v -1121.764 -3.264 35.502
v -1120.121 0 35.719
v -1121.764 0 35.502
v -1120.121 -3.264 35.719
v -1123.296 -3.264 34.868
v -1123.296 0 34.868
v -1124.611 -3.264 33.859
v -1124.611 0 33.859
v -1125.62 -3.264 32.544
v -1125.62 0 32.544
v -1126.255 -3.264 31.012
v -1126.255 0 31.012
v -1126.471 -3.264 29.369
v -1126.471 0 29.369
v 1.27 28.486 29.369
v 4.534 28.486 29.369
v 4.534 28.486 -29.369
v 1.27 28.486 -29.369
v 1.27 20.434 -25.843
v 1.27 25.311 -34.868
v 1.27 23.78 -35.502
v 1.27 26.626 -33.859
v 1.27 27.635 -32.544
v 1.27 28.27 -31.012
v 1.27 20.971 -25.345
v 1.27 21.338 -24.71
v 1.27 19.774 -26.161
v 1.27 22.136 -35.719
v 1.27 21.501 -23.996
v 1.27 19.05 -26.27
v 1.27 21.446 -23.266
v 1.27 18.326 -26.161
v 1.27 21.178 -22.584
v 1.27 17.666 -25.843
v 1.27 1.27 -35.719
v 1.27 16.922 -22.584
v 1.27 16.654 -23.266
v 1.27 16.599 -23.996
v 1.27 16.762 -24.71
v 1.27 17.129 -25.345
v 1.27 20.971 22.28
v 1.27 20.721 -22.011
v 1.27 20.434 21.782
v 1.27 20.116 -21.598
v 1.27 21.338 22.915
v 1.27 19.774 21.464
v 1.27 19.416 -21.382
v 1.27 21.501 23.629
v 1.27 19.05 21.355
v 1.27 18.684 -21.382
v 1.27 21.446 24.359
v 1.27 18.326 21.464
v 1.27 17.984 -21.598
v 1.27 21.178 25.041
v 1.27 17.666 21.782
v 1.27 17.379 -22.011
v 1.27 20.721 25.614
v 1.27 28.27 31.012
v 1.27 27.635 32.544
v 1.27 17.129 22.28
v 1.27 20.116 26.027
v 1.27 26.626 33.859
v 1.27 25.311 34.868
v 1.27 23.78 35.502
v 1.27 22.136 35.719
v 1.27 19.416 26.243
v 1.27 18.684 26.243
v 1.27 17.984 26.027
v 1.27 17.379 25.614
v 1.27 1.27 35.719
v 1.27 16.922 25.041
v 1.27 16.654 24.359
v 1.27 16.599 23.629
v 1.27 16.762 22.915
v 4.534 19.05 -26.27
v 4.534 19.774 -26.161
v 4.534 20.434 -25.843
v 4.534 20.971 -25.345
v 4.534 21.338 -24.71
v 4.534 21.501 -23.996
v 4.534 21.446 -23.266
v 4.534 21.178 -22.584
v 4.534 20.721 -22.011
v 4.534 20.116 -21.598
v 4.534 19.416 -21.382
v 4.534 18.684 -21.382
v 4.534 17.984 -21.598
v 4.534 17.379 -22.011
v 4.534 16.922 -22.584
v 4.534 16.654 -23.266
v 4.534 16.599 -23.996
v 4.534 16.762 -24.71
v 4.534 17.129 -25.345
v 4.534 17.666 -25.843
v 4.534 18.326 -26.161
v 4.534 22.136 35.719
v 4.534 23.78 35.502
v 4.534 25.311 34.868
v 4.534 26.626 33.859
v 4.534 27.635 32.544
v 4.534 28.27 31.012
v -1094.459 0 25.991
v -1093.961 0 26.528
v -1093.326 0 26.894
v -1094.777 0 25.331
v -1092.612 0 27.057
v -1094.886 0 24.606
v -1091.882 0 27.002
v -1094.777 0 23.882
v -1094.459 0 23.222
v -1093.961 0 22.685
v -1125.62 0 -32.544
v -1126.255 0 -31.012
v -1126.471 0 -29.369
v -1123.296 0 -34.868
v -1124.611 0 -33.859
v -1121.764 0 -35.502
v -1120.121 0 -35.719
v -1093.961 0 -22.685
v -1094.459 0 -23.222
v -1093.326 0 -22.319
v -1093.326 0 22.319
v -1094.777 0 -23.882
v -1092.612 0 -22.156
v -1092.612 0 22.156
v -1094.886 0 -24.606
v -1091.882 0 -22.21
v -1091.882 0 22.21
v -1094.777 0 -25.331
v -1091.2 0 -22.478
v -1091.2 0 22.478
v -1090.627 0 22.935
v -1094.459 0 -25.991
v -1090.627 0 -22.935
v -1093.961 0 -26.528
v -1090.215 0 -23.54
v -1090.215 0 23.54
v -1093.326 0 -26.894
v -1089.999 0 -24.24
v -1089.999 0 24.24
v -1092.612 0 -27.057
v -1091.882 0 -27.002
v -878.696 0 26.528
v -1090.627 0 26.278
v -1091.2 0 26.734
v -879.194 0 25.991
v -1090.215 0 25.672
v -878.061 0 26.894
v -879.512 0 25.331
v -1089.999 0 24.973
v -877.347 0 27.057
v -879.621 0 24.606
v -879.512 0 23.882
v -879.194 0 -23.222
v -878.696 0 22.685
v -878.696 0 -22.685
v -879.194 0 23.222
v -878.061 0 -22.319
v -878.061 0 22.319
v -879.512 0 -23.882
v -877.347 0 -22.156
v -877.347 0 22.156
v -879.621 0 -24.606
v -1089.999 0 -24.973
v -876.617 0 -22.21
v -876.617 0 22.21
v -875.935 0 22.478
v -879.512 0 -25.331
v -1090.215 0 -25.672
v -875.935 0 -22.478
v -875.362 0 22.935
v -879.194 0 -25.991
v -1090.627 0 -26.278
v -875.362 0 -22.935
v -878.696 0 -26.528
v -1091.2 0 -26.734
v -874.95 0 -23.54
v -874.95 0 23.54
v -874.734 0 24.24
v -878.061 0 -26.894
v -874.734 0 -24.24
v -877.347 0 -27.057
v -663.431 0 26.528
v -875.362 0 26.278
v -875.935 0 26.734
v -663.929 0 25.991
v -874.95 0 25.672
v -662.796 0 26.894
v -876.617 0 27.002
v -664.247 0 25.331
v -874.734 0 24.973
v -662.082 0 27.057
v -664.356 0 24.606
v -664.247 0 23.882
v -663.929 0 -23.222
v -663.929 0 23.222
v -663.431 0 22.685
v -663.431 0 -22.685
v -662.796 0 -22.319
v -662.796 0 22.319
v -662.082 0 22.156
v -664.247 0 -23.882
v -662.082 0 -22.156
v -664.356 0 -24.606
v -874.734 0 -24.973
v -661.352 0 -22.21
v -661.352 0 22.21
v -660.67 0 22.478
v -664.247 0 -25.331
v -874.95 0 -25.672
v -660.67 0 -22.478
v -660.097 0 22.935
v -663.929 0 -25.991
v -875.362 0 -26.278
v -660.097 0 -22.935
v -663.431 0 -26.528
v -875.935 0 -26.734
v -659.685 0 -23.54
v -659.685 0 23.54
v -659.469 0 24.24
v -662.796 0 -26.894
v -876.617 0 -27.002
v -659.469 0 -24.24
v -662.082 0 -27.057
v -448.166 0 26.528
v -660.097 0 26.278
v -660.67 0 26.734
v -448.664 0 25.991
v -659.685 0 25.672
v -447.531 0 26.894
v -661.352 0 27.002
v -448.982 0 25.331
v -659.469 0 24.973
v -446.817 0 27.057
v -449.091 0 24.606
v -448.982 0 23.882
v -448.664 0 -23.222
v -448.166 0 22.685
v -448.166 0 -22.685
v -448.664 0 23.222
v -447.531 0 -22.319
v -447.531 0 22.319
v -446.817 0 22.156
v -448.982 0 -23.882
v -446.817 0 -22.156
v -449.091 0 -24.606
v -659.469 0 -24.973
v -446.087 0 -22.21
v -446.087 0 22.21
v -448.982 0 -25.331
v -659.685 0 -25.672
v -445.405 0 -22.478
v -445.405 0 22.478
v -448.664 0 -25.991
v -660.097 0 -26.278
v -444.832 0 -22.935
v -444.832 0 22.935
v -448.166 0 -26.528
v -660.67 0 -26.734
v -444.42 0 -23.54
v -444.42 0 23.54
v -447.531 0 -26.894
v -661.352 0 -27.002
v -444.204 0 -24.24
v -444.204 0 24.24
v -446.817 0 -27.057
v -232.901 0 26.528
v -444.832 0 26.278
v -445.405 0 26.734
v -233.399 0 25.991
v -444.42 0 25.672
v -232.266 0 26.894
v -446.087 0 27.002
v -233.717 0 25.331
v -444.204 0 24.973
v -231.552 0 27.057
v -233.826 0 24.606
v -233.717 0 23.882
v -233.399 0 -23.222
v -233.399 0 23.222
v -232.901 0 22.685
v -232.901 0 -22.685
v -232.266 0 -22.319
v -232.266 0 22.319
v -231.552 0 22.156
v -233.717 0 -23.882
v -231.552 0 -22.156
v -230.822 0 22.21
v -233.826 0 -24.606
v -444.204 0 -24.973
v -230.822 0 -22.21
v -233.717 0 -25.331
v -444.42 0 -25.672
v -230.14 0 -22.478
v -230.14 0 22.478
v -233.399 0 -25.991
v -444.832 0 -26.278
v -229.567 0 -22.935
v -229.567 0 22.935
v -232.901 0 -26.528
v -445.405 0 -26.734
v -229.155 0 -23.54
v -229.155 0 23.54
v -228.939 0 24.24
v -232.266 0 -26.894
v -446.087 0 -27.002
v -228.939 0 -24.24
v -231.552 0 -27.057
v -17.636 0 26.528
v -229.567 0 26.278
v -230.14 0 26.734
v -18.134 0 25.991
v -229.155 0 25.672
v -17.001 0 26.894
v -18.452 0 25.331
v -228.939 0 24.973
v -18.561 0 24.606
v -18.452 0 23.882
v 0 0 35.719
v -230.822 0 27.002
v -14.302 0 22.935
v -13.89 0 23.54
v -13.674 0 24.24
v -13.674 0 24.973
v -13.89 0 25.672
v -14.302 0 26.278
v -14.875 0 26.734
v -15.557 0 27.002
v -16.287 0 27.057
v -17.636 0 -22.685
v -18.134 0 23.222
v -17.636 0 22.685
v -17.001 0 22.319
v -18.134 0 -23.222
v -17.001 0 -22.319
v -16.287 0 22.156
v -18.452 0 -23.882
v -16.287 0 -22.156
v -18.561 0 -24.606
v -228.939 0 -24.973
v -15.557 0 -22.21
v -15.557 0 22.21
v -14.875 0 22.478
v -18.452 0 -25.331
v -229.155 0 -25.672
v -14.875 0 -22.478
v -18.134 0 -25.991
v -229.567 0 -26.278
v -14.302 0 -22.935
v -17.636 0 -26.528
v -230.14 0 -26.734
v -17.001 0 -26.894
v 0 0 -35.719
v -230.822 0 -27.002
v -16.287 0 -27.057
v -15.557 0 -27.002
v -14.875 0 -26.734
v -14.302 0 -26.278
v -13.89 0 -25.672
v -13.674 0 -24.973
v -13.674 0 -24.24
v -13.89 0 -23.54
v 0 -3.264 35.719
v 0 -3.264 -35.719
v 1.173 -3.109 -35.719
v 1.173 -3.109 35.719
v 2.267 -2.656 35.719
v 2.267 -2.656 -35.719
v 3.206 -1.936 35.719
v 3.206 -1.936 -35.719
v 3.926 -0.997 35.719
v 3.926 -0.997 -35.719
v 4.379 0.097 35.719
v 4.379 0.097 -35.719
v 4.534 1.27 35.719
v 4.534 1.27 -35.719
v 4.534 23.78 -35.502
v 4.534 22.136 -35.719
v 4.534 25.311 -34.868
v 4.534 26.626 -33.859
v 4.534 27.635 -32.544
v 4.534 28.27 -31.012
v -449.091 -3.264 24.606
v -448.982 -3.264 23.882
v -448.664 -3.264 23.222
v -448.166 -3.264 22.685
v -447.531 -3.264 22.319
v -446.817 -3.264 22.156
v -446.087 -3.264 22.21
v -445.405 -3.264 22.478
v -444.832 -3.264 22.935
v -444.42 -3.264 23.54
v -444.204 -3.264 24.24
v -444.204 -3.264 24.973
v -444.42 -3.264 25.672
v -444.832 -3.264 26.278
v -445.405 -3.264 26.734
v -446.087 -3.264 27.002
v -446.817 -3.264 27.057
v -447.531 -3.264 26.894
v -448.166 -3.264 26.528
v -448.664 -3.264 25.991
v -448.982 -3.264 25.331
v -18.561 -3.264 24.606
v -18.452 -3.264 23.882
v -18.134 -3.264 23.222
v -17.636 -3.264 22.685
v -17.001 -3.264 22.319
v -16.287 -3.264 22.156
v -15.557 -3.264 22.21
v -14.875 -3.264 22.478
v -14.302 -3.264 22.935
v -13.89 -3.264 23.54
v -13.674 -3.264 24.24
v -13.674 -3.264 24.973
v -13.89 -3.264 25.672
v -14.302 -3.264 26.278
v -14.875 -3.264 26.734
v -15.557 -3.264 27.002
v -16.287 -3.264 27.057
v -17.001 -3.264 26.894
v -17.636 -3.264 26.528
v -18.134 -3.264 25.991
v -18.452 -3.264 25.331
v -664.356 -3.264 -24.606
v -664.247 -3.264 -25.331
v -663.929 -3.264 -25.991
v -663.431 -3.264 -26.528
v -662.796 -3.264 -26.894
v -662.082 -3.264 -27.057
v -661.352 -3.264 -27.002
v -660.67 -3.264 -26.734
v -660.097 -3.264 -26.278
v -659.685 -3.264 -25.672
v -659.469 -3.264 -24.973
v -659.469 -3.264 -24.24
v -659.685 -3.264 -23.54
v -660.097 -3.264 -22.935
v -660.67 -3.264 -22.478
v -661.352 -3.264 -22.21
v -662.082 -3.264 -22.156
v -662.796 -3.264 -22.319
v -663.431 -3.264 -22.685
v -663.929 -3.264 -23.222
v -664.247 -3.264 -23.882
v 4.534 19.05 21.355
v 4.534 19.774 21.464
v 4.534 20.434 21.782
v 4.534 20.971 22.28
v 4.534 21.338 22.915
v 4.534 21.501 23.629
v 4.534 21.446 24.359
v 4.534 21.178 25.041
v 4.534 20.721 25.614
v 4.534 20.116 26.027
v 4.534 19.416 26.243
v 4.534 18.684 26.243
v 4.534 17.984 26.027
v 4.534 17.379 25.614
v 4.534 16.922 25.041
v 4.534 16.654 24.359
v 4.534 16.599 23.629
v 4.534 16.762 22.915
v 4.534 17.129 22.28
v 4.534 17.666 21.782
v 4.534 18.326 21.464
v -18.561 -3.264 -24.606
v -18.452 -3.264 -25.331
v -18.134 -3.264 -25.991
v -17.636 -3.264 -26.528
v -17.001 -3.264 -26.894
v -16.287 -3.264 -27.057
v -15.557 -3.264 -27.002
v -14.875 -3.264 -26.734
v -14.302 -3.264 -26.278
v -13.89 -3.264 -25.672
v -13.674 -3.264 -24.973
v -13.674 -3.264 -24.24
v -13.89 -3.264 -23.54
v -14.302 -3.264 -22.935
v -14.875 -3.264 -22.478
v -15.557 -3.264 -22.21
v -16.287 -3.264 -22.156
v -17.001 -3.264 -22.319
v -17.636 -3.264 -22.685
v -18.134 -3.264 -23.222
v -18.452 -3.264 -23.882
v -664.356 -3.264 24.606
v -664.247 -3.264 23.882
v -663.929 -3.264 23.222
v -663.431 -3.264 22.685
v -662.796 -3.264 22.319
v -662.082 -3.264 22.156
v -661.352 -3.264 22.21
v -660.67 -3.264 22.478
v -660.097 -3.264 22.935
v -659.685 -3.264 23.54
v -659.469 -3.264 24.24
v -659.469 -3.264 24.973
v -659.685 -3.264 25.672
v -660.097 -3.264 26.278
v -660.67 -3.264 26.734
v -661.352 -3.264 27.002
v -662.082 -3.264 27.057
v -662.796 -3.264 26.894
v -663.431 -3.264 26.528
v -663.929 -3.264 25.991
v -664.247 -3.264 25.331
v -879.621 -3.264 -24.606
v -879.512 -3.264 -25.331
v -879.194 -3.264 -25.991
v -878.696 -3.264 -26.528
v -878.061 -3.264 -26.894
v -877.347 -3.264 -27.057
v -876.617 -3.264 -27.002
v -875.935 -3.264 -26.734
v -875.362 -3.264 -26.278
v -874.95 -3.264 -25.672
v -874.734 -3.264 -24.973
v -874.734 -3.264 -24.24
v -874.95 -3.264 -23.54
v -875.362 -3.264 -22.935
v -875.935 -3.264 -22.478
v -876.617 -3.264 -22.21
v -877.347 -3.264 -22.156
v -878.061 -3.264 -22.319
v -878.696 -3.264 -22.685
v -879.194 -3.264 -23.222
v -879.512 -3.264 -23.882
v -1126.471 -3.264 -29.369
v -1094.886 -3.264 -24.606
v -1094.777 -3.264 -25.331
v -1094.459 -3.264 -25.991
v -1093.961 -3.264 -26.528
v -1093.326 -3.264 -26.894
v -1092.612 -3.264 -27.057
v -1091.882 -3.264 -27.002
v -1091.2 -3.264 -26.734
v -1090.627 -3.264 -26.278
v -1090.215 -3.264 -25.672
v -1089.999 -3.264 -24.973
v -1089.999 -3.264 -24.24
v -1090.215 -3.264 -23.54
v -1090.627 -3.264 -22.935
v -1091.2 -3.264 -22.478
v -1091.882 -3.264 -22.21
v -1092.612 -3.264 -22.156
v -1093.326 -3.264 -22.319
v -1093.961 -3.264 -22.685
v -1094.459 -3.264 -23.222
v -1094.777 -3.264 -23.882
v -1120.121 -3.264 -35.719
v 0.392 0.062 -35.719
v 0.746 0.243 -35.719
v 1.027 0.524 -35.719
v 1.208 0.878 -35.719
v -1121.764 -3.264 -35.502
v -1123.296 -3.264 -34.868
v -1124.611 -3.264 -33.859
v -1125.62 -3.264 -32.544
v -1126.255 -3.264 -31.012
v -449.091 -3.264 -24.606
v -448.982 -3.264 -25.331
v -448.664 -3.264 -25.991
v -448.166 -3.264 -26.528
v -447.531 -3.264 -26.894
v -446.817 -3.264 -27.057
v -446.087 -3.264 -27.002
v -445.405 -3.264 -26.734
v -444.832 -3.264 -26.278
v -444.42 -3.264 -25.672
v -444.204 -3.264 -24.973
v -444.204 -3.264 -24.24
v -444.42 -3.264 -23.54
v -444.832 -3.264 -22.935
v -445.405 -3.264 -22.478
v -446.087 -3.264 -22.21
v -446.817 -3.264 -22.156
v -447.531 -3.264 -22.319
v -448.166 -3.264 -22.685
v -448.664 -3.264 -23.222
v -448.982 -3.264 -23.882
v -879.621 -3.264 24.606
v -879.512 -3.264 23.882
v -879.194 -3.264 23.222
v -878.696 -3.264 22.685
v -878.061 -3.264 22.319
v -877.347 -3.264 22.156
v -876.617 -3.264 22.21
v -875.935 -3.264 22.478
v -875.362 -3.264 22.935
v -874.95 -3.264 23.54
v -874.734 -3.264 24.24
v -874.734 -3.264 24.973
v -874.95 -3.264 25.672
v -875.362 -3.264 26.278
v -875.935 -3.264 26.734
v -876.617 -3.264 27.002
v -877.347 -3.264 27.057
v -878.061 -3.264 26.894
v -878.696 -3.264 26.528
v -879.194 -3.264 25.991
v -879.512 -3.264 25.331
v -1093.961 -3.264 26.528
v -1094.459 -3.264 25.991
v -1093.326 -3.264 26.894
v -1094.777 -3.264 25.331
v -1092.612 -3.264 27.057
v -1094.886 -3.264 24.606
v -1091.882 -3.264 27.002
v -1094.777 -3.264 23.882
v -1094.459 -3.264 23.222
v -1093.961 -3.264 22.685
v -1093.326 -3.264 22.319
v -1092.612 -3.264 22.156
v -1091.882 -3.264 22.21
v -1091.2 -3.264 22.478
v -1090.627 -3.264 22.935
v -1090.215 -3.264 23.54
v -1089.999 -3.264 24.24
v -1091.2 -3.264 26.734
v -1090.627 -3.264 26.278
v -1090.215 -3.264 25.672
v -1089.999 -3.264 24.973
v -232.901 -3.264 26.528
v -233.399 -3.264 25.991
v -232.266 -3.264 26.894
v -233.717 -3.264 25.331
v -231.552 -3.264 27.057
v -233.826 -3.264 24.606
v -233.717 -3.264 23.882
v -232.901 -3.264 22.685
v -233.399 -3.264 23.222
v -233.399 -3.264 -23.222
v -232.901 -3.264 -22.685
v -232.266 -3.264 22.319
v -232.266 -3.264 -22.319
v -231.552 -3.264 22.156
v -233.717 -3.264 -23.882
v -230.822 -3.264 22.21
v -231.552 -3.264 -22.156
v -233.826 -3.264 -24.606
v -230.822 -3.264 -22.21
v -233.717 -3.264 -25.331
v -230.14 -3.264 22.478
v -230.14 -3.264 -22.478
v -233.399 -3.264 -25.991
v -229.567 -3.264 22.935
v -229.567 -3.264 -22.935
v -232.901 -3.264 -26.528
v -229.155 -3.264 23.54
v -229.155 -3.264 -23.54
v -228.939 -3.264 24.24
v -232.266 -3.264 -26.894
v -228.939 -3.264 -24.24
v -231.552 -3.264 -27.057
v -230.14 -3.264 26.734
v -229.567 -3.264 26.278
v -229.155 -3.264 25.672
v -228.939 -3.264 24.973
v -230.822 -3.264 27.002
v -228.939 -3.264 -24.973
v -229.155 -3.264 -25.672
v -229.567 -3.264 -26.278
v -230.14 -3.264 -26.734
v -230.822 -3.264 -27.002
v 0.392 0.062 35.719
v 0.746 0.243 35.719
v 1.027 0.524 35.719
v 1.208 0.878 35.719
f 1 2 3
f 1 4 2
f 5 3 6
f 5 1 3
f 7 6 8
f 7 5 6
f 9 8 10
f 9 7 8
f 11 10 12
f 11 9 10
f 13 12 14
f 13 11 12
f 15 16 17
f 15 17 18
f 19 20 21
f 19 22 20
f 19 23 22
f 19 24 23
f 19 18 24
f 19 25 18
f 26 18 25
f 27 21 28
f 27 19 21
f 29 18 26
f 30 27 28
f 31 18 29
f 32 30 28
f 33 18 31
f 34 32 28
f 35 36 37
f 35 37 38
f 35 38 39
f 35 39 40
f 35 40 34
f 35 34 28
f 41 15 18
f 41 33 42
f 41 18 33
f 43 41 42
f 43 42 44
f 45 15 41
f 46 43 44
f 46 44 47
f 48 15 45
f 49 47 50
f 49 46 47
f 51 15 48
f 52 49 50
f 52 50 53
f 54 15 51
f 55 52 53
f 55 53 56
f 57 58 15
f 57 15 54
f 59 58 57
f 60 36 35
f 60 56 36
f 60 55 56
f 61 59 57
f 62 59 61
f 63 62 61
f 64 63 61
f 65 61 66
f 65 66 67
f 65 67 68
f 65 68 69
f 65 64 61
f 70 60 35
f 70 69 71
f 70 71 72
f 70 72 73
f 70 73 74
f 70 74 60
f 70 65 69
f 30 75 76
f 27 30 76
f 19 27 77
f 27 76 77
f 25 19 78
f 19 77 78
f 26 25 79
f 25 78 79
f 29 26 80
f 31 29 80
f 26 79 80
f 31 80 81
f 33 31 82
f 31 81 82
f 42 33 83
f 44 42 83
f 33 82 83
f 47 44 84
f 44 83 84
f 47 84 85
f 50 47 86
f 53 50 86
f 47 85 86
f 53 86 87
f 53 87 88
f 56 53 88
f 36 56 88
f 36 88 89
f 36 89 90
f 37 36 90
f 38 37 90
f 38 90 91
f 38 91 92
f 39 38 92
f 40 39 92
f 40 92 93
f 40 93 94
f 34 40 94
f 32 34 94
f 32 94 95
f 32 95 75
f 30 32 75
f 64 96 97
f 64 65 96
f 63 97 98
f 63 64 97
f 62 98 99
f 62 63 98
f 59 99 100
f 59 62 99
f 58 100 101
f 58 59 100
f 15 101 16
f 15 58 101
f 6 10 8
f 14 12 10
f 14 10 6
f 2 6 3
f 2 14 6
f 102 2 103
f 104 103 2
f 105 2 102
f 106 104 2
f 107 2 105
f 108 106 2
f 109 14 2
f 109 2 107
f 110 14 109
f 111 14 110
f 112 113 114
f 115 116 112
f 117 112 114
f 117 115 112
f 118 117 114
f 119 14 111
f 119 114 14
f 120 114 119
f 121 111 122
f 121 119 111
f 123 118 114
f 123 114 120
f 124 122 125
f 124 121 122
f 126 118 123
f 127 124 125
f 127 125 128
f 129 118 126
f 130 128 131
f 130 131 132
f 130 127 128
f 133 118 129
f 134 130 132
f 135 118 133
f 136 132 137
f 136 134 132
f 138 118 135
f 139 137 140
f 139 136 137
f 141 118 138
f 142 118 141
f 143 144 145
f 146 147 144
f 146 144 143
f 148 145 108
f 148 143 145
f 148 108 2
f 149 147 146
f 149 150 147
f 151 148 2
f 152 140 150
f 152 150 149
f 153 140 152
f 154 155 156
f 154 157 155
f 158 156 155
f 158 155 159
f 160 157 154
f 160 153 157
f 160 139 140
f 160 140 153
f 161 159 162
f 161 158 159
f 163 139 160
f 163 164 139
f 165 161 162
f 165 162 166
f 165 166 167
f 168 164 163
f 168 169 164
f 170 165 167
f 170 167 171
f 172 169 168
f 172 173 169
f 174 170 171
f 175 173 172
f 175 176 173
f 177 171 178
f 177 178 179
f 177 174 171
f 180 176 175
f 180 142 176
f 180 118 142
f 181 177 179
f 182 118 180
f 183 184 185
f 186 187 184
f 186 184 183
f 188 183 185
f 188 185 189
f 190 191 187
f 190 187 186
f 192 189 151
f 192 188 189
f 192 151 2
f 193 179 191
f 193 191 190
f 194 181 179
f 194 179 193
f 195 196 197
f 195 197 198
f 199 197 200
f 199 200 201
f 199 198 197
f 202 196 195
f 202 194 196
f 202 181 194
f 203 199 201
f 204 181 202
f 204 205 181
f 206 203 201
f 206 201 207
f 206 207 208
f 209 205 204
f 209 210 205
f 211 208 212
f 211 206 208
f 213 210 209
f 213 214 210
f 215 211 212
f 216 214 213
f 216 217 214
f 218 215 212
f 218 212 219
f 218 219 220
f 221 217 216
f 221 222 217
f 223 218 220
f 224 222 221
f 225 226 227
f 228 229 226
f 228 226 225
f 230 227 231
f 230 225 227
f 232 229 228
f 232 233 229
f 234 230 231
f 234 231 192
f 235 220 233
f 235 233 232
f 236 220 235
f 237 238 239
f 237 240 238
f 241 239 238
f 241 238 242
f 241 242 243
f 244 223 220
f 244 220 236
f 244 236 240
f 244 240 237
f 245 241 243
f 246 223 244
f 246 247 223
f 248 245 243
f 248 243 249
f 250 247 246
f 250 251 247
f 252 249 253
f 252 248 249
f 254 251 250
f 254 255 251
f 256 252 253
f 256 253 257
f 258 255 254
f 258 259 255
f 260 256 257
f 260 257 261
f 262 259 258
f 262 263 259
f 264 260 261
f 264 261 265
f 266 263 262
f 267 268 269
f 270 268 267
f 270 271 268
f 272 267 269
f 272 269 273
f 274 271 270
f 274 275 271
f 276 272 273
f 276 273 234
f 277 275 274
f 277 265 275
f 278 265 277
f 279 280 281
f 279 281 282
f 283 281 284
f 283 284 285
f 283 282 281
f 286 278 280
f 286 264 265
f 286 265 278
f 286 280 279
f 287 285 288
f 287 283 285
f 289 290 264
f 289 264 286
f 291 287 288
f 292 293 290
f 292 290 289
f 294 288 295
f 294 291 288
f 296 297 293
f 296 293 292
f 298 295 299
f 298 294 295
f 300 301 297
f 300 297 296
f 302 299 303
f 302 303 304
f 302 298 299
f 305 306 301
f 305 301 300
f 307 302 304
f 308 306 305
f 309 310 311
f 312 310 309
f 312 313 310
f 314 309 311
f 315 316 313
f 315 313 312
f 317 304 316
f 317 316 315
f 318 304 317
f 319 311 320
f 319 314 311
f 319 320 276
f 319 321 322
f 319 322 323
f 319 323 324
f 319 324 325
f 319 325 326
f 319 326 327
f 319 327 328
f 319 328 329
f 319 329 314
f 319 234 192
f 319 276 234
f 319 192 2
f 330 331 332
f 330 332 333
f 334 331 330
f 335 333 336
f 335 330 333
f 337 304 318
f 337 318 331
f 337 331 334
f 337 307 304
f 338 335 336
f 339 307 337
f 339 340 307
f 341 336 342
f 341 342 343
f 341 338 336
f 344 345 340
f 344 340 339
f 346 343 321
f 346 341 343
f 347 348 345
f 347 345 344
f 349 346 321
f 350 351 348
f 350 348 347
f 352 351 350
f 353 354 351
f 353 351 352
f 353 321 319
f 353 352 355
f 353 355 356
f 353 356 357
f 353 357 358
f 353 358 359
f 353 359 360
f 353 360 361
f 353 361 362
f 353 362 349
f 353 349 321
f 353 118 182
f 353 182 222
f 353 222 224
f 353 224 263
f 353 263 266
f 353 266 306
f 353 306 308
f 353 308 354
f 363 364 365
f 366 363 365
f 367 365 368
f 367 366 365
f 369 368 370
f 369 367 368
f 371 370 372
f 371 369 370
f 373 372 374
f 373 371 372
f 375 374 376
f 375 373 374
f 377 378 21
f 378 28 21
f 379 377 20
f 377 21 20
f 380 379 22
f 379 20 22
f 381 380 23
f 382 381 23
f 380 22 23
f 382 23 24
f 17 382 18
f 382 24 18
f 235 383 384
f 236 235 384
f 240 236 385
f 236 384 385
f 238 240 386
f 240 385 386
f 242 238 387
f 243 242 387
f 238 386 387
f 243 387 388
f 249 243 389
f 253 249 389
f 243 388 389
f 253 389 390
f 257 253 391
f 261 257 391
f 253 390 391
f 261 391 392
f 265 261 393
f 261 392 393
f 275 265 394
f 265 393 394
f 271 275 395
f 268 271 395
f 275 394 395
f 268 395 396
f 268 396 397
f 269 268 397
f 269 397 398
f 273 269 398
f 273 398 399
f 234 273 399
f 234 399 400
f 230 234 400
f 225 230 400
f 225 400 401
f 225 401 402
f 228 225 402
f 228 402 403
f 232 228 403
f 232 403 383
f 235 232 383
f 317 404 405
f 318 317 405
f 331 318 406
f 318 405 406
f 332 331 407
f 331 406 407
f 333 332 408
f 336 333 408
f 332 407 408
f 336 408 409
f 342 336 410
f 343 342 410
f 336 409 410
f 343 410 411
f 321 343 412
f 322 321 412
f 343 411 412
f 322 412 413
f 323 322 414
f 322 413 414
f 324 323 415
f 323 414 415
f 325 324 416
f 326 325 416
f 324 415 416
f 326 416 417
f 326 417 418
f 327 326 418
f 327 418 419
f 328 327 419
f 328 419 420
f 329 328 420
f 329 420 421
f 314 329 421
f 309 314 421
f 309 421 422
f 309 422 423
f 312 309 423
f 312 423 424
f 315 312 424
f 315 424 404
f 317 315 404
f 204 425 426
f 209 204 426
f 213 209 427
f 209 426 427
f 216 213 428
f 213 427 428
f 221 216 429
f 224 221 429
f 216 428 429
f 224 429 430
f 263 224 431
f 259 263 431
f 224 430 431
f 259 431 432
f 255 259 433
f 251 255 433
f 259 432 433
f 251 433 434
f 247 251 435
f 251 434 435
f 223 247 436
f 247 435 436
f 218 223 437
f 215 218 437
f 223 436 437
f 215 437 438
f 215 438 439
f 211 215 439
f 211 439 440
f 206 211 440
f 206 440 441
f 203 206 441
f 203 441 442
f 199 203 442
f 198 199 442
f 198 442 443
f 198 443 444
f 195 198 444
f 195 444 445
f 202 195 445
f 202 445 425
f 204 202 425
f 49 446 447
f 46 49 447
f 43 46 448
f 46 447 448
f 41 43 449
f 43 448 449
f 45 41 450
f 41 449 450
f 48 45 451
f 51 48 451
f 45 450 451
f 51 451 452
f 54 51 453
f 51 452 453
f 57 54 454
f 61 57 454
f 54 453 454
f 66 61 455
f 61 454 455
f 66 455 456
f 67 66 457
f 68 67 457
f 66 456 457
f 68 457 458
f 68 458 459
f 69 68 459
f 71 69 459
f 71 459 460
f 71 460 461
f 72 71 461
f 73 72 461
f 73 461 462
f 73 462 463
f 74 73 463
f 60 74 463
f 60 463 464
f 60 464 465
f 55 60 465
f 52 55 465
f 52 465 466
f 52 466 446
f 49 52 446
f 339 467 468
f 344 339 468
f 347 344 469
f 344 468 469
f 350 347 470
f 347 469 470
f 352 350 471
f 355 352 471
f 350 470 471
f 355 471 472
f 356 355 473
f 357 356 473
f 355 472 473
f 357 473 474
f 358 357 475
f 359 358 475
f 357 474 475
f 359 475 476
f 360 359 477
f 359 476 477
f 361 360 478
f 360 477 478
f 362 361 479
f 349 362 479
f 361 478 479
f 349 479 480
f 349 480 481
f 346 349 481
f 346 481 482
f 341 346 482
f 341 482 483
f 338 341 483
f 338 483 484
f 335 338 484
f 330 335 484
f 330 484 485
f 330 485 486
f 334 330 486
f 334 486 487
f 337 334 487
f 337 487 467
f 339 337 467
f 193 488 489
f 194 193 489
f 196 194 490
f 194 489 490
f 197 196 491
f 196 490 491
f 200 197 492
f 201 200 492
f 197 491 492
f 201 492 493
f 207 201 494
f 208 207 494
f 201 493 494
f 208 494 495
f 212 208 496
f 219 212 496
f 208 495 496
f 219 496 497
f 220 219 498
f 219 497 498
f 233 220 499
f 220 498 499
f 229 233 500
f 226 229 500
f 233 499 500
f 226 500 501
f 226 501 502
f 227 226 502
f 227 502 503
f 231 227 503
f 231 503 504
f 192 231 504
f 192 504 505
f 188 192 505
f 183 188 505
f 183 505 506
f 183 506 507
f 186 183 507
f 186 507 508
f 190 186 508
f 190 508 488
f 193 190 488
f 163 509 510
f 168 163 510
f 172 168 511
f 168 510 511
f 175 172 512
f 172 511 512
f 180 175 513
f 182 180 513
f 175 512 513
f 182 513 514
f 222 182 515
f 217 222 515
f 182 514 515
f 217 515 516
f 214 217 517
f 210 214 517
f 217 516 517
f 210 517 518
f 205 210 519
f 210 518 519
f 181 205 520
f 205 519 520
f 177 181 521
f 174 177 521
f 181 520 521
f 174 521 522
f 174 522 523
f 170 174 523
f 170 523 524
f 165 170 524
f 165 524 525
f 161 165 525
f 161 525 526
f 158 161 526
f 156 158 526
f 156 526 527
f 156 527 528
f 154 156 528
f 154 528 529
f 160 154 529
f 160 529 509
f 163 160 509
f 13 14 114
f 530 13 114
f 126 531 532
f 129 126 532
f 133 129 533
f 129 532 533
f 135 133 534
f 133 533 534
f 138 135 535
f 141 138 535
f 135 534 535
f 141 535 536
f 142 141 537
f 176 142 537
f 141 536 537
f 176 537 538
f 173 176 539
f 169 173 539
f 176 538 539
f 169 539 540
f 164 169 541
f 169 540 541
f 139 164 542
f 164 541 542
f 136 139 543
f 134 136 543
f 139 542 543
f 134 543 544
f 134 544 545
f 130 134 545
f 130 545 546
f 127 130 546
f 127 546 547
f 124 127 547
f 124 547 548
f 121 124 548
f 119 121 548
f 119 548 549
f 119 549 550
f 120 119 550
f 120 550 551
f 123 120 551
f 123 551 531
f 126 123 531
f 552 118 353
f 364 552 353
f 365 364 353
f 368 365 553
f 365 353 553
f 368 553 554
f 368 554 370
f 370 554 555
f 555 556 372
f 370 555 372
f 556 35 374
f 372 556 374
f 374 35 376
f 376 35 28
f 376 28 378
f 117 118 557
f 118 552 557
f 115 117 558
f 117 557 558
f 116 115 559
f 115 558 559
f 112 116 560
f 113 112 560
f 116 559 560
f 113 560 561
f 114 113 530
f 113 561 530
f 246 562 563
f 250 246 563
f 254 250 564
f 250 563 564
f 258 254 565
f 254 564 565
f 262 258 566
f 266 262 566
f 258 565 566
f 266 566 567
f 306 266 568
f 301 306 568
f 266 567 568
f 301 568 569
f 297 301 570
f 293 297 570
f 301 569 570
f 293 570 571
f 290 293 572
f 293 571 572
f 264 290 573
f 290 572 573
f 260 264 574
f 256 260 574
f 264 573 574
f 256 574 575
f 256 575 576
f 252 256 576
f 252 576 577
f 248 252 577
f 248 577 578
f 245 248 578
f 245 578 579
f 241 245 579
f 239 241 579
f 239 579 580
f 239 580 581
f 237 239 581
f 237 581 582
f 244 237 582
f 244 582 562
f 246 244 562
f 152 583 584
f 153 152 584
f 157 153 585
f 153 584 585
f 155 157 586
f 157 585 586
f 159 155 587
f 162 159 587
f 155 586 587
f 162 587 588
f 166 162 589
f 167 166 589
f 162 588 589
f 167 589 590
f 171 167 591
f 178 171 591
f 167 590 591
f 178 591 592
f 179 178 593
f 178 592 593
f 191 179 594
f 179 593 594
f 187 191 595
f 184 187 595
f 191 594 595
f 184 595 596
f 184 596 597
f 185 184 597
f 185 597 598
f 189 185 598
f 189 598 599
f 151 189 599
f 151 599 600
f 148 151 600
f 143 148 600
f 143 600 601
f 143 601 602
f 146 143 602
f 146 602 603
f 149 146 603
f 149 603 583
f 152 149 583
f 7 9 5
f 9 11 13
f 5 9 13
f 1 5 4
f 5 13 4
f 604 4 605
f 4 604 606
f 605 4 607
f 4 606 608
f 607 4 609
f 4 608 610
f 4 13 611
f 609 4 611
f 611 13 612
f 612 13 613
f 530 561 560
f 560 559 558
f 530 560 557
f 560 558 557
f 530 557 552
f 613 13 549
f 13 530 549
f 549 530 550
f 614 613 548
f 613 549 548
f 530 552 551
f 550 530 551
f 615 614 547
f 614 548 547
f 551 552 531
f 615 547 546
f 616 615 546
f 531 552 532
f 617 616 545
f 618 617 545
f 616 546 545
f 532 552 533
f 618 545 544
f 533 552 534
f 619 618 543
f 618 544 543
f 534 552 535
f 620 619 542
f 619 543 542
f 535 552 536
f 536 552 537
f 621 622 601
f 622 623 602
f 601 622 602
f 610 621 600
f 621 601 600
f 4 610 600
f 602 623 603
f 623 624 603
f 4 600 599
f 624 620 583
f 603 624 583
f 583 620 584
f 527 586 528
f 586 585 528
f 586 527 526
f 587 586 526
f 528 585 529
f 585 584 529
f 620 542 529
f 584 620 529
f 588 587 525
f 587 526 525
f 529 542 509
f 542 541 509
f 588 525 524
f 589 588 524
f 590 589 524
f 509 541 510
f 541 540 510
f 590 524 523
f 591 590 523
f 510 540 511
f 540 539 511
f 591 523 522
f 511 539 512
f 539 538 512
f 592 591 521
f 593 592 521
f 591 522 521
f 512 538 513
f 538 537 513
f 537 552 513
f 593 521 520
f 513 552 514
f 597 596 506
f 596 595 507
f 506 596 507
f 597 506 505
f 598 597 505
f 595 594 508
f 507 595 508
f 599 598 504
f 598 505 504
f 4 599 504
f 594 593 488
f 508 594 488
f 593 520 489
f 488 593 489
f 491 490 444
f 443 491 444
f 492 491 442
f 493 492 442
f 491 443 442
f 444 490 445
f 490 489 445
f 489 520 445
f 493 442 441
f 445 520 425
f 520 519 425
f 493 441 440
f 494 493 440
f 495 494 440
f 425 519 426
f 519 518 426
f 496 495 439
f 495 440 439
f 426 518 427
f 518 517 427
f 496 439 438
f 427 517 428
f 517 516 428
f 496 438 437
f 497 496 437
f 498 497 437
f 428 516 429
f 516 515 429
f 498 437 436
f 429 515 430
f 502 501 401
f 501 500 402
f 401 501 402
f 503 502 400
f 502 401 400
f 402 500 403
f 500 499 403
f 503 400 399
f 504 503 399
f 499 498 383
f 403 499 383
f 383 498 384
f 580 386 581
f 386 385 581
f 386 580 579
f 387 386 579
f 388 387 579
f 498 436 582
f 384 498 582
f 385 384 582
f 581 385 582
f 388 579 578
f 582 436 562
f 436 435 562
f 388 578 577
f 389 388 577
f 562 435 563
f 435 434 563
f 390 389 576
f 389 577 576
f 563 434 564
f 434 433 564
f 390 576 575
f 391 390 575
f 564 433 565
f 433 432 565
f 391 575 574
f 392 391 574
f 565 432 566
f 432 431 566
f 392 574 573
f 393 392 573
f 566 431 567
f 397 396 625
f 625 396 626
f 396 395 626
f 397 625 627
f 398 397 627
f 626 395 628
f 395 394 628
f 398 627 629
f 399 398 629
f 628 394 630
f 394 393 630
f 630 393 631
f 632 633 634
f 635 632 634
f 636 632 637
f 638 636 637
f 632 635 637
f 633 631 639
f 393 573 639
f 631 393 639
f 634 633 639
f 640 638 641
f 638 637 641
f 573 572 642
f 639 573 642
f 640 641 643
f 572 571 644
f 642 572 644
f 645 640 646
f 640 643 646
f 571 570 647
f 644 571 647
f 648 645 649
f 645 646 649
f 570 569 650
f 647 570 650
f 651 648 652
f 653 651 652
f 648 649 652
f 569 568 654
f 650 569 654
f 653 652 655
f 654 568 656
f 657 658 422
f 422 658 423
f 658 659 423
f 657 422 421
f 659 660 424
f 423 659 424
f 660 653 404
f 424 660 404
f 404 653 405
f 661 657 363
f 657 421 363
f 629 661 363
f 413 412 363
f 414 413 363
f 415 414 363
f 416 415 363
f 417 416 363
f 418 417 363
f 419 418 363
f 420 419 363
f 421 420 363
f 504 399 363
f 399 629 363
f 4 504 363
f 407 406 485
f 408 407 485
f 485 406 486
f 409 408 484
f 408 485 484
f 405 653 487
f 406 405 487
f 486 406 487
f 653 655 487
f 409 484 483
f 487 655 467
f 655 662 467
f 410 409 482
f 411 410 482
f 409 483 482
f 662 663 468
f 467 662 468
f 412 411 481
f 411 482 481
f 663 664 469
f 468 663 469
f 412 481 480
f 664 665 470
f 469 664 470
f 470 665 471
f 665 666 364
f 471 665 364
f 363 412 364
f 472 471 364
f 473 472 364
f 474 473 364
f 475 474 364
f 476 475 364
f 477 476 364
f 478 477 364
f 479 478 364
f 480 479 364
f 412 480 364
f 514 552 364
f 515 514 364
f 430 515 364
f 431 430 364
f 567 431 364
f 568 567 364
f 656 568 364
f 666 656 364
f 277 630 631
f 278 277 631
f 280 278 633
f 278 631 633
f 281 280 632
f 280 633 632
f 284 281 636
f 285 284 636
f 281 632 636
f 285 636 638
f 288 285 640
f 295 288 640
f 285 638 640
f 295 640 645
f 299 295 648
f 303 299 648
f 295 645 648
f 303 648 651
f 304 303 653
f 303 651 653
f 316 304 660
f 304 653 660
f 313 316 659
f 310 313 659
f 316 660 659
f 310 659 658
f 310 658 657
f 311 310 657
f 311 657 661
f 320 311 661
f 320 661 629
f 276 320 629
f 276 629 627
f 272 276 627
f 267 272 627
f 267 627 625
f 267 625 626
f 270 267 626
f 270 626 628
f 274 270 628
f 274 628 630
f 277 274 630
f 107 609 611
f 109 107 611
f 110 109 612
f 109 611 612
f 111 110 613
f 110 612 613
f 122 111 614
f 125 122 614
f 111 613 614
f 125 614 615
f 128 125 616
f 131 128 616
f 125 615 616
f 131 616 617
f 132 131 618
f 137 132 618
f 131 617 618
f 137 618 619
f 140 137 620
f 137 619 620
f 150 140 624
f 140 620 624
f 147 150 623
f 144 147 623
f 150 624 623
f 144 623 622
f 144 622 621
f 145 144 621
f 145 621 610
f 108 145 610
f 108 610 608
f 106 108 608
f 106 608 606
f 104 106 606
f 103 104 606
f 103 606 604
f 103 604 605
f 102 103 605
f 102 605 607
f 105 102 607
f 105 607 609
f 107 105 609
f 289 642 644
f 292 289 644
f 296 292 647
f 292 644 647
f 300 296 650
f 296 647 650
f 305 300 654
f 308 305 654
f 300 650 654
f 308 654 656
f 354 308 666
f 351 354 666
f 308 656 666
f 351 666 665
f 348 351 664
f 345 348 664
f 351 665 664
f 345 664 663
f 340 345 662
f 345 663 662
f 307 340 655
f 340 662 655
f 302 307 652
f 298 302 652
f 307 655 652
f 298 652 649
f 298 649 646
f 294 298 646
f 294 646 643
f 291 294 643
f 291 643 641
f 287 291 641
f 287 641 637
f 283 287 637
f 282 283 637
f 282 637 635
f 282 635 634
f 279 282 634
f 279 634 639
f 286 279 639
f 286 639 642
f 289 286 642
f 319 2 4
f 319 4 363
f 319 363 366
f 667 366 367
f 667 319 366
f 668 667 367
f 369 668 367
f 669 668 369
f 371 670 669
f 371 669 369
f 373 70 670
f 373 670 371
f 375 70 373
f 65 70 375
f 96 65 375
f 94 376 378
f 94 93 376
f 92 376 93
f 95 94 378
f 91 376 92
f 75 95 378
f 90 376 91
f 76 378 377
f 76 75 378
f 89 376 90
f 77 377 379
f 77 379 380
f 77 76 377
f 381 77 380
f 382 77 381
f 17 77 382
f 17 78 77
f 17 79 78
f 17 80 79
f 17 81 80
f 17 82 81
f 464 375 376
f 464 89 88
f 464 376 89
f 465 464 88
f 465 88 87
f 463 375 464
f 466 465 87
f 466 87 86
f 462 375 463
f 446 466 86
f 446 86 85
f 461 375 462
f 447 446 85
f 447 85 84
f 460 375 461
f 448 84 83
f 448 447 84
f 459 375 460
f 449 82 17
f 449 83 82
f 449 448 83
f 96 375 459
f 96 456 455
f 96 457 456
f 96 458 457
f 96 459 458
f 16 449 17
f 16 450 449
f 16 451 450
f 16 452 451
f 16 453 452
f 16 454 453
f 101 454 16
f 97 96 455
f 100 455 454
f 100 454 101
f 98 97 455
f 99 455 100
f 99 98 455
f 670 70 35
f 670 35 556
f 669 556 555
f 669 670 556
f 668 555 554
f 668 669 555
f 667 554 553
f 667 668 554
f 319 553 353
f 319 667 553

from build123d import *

# Parameters (mm, degrees)
SKETCH1_W                    = 1126.47095
SKETCH1_H                    = 71.4375
BASE_FLANGE1_DEPTH           = 3.2639
EDGE_FLANGE2_DEPTH           = 71.4375
F_10_0_1935_DIAMETER_HOLE1_D = 4.9149
LPATTERN1_COUNT              = 6
LPATTERN1_PITCH              = 215.265
F_10_0_1935_DIAMETER_HOLE2_D = 4.9149
FILLET1_R                    = 6.35


# Sheet-metal steps are written as plain solids
with BuildPart() as part:
    # Sketch1 → Base-Flange1 (new body)
    with BuildSketch(Plane(origin=(0, 0, 0), x_dir=(1, 0, 0), z_dir=(0, 1, 0))):
        with Locations((-563.235475, 0)):
            Rectangle(SKETCH1_W, SKETCH1_H)
    extrude(amount=-BASE_FLANGE1_DEPTH)

    # Edge-Flange2 section (across the edge) → Edge-Flange2 (add)
    with BuildSketch(Plane(origin=(1.27, 0, 35.71875), x_dir=(-1, 0, 0), z_dir=(0, 0, -1))):
        with BuildLine():
            Line((-3.2639, 1.27), (-3.2639, 28.4861))
            Line((-3.2639, 28.4861), (0, 28.4861))
            Line((0, 28.4861), (0, 1.27))
            ThreePointArc((0, 1.27), (0.371974388, 0.371974388), (1.27, 0))
            Line((1.27, 0), (1.27, -3.2639))
            ThreePointArc((1.27, -3.2639), (-1.935951435, -1.935951435), (-3.2639, 1.27))
        make_face()
    extrude(amount=EDGE_FLANGE2_DEPTH)

    # #10 (0.1935) Diameter Hole1 (through all)
    with Locations(Plane(origin=(0, 0, 0), x_dir=(1, 0, 0), z_dir=(0, 1, 0))):
        with Locations((-16.1036, 24.60625), (-16.1036, -24.60625)):
            f_10_0_1935_diameter_hole1 = Hole(F_10_0_1935_DIAMETER_HOLE1_D / 2)

    # LPattern1: #10 (0.1935) Diameter Hole1 ×6
    with Locations(*[(-i * LPATTERN1_PITCH, 0, 0) for i in range(1, LPATTERN1_COUNT)]):
        add(f_10_0_1935_diameter_hole1, mode=Mode.SUBTRACT)

    # #10 (0.1935) Diameter Hole2 (through all)
    with Locations(Plane.ZY.offset(-1.27)):
        with Locations((-23.8125, 19.05), (23.8125, 19.05)):
            Hole(F_10_0_1935_DIAMETER_HOLE2_D / 2)

    # Fillet1
    fillet1_edges = [part.edges().sort_by_distance(p)[0] for p in [
        (2.90195, 28.4861, 35.71875),
        (2.90195, 28.4861, -35.71875),
        (-1126.47095, -1.63195, -35.71875),
        (-1126.47095, -1.63195, 35.71875),
    ]]
    fillet(fillet1_edges, radius=FILLET1_R)


solid = part.part
